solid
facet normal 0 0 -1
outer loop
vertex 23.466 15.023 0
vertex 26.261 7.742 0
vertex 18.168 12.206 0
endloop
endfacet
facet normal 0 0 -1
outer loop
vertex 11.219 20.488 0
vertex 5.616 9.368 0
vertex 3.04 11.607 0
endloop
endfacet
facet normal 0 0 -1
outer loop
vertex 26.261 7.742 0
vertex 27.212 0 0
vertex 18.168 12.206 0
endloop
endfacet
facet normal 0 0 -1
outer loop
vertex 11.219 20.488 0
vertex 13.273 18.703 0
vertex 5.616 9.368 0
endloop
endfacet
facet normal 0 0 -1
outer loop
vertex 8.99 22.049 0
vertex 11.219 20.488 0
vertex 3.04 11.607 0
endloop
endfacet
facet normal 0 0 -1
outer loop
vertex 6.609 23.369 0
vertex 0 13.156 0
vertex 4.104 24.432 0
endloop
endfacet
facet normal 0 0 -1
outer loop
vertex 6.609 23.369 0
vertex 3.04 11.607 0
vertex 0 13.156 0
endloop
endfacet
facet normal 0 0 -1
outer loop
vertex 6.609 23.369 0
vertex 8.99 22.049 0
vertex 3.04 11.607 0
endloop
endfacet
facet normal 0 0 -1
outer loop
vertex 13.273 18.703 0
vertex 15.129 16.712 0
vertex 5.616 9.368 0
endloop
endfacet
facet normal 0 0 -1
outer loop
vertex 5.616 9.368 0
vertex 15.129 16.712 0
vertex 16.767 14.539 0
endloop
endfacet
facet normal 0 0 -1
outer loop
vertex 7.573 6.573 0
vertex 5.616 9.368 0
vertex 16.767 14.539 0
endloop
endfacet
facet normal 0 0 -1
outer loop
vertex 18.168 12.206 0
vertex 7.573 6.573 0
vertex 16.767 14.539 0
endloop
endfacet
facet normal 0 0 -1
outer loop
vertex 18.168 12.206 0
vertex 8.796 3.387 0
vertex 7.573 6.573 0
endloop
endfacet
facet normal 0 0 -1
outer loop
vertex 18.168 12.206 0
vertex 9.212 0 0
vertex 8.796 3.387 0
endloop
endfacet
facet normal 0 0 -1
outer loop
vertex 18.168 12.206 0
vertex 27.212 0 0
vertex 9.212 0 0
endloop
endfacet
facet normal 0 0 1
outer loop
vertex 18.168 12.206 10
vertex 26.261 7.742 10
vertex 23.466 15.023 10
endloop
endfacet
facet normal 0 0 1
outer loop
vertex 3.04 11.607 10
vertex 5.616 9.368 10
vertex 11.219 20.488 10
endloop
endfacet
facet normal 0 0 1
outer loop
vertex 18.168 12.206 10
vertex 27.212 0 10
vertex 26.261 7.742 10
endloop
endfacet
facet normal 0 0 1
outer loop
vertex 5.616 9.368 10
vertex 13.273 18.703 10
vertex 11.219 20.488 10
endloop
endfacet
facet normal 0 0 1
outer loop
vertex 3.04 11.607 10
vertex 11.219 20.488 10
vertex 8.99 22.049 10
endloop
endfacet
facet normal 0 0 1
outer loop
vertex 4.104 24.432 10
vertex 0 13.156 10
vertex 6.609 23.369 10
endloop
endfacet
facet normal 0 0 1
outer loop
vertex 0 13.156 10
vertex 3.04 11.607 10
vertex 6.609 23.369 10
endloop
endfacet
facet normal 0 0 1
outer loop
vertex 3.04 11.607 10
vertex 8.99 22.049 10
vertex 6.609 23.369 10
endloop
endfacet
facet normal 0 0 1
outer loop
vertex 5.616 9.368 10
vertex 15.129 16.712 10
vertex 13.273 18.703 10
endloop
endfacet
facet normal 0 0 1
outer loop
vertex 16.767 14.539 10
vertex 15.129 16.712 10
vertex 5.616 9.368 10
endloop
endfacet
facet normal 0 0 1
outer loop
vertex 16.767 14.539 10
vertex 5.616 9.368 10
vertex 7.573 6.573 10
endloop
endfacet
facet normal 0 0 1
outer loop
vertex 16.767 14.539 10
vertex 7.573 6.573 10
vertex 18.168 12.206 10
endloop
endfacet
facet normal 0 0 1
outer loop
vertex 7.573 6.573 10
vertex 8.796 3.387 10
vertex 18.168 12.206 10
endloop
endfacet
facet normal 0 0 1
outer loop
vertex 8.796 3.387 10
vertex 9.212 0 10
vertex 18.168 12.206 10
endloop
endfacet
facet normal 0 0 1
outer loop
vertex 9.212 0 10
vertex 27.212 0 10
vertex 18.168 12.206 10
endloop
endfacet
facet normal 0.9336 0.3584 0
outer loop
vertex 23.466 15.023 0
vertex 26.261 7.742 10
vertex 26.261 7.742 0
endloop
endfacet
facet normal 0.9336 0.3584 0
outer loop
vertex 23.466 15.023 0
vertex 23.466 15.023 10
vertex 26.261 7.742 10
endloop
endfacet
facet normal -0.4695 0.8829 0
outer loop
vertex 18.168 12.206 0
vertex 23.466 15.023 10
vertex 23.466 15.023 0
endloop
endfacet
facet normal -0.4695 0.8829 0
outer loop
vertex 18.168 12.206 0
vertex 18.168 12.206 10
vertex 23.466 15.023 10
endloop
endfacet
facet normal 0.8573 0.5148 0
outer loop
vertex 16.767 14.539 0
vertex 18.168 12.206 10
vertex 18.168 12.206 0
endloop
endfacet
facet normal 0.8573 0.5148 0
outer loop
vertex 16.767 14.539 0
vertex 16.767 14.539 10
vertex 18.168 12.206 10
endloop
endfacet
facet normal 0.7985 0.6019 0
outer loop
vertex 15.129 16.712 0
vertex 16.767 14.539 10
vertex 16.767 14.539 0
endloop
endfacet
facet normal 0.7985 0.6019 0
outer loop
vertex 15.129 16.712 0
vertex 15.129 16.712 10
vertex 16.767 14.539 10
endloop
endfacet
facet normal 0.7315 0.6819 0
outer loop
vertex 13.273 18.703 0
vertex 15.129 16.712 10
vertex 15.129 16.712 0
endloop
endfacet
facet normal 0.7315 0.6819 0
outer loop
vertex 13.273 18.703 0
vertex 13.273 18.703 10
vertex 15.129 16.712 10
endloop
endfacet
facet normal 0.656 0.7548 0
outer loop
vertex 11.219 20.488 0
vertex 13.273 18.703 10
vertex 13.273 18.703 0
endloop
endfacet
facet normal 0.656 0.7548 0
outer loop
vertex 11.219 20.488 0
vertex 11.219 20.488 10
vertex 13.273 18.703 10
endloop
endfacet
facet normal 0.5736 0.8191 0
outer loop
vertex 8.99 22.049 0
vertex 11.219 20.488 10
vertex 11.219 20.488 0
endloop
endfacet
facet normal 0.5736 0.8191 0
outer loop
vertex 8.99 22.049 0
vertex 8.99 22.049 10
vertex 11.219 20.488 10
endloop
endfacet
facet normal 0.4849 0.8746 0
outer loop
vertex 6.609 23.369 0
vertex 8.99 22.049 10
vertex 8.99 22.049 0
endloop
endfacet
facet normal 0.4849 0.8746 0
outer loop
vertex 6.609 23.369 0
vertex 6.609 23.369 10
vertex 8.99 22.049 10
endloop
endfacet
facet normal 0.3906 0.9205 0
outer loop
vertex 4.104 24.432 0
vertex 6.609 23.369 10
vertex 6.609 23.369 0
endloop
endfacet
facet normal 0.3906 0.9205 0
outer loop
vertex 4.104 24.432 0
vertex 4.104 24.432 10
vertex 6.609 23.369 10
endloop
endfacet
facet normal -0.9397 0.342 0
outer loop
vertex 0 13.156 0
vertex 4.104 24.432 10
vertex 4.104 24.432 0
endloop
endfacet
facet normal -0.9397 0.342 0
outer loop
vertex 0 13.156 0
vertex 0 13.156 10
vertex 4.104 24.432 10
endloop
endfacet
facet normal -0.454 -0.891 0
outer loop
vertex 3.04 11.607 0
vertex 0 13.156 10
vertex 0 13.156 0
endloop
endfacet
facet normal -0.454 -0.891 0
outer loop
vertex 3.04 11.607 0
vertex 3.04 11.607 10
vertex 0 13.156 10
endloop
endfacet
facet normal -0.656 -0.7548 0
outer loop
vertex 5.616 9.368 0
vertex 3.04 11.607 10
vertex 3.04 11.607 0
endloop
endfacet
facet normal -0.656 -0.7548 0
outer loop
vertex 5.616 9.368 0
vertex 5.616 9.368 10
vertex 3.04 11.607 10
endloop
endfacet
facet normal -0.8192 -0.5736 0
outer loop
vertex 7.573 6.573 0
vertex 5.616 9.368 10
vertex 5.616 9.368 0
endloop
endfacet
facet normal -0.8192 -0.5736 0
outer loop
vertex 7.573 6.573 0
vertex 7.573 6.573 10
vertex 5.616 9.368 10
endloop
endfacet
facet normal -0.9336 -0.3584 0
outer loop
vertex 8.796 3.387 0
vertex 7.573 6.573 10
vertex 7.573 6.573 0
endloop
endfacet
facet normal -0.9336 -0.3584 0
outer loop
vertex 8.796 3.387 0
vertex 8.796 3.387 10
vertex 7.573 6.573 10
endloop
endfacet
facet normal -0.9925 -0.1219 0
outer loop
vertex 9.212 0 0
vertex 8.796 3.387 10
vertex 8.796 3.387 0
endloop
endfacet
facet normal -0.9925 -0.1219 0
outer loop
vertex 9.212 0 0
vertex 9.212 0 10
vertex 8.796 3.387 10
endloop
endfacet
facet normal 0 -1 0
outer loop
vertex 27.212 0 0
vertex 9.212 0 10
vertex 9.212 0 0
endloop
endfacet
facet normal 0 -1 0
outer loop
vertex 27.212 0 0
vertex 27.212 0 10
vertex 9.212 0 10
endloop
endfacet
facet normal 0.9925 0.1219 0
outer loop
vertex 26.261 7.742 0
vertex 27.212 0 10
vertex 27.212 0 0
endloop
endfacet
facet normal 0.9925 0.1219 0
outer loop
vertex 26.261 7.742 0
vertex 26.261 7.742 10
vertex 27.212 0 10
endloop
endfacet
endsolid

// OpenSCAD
$fn = 32;

// ----------------------------------------------------------------------
// Arc stop: segment, 10 mm thick
// ----------------------------------------------------------------------

// --- parameters (mm) ---
profile_height = 10;      // extrusion height
profile_points = 17;      // points of the closed outline

profile = [[27.212, 0], [26.261, 7.742], [23.466, 15.023], [18.168, 12.206], [16.767, 14.539], [15.129, 16.712], [13.273, 18.703], [11.219, 20.488], [8.99, 22.049], [6.609, 23.369], [4.104, 24.432], [0, 13.156], [3.04, 11.607], [5.616, 9.368], [7.573, 6.573], [8.796, 3.387], [9.212, 0]];  // single closed polygon, 17 points, counter clockwise

// --- the one profile operation ---
linear_extrude(height = profile_height) polygon(points = profile);
